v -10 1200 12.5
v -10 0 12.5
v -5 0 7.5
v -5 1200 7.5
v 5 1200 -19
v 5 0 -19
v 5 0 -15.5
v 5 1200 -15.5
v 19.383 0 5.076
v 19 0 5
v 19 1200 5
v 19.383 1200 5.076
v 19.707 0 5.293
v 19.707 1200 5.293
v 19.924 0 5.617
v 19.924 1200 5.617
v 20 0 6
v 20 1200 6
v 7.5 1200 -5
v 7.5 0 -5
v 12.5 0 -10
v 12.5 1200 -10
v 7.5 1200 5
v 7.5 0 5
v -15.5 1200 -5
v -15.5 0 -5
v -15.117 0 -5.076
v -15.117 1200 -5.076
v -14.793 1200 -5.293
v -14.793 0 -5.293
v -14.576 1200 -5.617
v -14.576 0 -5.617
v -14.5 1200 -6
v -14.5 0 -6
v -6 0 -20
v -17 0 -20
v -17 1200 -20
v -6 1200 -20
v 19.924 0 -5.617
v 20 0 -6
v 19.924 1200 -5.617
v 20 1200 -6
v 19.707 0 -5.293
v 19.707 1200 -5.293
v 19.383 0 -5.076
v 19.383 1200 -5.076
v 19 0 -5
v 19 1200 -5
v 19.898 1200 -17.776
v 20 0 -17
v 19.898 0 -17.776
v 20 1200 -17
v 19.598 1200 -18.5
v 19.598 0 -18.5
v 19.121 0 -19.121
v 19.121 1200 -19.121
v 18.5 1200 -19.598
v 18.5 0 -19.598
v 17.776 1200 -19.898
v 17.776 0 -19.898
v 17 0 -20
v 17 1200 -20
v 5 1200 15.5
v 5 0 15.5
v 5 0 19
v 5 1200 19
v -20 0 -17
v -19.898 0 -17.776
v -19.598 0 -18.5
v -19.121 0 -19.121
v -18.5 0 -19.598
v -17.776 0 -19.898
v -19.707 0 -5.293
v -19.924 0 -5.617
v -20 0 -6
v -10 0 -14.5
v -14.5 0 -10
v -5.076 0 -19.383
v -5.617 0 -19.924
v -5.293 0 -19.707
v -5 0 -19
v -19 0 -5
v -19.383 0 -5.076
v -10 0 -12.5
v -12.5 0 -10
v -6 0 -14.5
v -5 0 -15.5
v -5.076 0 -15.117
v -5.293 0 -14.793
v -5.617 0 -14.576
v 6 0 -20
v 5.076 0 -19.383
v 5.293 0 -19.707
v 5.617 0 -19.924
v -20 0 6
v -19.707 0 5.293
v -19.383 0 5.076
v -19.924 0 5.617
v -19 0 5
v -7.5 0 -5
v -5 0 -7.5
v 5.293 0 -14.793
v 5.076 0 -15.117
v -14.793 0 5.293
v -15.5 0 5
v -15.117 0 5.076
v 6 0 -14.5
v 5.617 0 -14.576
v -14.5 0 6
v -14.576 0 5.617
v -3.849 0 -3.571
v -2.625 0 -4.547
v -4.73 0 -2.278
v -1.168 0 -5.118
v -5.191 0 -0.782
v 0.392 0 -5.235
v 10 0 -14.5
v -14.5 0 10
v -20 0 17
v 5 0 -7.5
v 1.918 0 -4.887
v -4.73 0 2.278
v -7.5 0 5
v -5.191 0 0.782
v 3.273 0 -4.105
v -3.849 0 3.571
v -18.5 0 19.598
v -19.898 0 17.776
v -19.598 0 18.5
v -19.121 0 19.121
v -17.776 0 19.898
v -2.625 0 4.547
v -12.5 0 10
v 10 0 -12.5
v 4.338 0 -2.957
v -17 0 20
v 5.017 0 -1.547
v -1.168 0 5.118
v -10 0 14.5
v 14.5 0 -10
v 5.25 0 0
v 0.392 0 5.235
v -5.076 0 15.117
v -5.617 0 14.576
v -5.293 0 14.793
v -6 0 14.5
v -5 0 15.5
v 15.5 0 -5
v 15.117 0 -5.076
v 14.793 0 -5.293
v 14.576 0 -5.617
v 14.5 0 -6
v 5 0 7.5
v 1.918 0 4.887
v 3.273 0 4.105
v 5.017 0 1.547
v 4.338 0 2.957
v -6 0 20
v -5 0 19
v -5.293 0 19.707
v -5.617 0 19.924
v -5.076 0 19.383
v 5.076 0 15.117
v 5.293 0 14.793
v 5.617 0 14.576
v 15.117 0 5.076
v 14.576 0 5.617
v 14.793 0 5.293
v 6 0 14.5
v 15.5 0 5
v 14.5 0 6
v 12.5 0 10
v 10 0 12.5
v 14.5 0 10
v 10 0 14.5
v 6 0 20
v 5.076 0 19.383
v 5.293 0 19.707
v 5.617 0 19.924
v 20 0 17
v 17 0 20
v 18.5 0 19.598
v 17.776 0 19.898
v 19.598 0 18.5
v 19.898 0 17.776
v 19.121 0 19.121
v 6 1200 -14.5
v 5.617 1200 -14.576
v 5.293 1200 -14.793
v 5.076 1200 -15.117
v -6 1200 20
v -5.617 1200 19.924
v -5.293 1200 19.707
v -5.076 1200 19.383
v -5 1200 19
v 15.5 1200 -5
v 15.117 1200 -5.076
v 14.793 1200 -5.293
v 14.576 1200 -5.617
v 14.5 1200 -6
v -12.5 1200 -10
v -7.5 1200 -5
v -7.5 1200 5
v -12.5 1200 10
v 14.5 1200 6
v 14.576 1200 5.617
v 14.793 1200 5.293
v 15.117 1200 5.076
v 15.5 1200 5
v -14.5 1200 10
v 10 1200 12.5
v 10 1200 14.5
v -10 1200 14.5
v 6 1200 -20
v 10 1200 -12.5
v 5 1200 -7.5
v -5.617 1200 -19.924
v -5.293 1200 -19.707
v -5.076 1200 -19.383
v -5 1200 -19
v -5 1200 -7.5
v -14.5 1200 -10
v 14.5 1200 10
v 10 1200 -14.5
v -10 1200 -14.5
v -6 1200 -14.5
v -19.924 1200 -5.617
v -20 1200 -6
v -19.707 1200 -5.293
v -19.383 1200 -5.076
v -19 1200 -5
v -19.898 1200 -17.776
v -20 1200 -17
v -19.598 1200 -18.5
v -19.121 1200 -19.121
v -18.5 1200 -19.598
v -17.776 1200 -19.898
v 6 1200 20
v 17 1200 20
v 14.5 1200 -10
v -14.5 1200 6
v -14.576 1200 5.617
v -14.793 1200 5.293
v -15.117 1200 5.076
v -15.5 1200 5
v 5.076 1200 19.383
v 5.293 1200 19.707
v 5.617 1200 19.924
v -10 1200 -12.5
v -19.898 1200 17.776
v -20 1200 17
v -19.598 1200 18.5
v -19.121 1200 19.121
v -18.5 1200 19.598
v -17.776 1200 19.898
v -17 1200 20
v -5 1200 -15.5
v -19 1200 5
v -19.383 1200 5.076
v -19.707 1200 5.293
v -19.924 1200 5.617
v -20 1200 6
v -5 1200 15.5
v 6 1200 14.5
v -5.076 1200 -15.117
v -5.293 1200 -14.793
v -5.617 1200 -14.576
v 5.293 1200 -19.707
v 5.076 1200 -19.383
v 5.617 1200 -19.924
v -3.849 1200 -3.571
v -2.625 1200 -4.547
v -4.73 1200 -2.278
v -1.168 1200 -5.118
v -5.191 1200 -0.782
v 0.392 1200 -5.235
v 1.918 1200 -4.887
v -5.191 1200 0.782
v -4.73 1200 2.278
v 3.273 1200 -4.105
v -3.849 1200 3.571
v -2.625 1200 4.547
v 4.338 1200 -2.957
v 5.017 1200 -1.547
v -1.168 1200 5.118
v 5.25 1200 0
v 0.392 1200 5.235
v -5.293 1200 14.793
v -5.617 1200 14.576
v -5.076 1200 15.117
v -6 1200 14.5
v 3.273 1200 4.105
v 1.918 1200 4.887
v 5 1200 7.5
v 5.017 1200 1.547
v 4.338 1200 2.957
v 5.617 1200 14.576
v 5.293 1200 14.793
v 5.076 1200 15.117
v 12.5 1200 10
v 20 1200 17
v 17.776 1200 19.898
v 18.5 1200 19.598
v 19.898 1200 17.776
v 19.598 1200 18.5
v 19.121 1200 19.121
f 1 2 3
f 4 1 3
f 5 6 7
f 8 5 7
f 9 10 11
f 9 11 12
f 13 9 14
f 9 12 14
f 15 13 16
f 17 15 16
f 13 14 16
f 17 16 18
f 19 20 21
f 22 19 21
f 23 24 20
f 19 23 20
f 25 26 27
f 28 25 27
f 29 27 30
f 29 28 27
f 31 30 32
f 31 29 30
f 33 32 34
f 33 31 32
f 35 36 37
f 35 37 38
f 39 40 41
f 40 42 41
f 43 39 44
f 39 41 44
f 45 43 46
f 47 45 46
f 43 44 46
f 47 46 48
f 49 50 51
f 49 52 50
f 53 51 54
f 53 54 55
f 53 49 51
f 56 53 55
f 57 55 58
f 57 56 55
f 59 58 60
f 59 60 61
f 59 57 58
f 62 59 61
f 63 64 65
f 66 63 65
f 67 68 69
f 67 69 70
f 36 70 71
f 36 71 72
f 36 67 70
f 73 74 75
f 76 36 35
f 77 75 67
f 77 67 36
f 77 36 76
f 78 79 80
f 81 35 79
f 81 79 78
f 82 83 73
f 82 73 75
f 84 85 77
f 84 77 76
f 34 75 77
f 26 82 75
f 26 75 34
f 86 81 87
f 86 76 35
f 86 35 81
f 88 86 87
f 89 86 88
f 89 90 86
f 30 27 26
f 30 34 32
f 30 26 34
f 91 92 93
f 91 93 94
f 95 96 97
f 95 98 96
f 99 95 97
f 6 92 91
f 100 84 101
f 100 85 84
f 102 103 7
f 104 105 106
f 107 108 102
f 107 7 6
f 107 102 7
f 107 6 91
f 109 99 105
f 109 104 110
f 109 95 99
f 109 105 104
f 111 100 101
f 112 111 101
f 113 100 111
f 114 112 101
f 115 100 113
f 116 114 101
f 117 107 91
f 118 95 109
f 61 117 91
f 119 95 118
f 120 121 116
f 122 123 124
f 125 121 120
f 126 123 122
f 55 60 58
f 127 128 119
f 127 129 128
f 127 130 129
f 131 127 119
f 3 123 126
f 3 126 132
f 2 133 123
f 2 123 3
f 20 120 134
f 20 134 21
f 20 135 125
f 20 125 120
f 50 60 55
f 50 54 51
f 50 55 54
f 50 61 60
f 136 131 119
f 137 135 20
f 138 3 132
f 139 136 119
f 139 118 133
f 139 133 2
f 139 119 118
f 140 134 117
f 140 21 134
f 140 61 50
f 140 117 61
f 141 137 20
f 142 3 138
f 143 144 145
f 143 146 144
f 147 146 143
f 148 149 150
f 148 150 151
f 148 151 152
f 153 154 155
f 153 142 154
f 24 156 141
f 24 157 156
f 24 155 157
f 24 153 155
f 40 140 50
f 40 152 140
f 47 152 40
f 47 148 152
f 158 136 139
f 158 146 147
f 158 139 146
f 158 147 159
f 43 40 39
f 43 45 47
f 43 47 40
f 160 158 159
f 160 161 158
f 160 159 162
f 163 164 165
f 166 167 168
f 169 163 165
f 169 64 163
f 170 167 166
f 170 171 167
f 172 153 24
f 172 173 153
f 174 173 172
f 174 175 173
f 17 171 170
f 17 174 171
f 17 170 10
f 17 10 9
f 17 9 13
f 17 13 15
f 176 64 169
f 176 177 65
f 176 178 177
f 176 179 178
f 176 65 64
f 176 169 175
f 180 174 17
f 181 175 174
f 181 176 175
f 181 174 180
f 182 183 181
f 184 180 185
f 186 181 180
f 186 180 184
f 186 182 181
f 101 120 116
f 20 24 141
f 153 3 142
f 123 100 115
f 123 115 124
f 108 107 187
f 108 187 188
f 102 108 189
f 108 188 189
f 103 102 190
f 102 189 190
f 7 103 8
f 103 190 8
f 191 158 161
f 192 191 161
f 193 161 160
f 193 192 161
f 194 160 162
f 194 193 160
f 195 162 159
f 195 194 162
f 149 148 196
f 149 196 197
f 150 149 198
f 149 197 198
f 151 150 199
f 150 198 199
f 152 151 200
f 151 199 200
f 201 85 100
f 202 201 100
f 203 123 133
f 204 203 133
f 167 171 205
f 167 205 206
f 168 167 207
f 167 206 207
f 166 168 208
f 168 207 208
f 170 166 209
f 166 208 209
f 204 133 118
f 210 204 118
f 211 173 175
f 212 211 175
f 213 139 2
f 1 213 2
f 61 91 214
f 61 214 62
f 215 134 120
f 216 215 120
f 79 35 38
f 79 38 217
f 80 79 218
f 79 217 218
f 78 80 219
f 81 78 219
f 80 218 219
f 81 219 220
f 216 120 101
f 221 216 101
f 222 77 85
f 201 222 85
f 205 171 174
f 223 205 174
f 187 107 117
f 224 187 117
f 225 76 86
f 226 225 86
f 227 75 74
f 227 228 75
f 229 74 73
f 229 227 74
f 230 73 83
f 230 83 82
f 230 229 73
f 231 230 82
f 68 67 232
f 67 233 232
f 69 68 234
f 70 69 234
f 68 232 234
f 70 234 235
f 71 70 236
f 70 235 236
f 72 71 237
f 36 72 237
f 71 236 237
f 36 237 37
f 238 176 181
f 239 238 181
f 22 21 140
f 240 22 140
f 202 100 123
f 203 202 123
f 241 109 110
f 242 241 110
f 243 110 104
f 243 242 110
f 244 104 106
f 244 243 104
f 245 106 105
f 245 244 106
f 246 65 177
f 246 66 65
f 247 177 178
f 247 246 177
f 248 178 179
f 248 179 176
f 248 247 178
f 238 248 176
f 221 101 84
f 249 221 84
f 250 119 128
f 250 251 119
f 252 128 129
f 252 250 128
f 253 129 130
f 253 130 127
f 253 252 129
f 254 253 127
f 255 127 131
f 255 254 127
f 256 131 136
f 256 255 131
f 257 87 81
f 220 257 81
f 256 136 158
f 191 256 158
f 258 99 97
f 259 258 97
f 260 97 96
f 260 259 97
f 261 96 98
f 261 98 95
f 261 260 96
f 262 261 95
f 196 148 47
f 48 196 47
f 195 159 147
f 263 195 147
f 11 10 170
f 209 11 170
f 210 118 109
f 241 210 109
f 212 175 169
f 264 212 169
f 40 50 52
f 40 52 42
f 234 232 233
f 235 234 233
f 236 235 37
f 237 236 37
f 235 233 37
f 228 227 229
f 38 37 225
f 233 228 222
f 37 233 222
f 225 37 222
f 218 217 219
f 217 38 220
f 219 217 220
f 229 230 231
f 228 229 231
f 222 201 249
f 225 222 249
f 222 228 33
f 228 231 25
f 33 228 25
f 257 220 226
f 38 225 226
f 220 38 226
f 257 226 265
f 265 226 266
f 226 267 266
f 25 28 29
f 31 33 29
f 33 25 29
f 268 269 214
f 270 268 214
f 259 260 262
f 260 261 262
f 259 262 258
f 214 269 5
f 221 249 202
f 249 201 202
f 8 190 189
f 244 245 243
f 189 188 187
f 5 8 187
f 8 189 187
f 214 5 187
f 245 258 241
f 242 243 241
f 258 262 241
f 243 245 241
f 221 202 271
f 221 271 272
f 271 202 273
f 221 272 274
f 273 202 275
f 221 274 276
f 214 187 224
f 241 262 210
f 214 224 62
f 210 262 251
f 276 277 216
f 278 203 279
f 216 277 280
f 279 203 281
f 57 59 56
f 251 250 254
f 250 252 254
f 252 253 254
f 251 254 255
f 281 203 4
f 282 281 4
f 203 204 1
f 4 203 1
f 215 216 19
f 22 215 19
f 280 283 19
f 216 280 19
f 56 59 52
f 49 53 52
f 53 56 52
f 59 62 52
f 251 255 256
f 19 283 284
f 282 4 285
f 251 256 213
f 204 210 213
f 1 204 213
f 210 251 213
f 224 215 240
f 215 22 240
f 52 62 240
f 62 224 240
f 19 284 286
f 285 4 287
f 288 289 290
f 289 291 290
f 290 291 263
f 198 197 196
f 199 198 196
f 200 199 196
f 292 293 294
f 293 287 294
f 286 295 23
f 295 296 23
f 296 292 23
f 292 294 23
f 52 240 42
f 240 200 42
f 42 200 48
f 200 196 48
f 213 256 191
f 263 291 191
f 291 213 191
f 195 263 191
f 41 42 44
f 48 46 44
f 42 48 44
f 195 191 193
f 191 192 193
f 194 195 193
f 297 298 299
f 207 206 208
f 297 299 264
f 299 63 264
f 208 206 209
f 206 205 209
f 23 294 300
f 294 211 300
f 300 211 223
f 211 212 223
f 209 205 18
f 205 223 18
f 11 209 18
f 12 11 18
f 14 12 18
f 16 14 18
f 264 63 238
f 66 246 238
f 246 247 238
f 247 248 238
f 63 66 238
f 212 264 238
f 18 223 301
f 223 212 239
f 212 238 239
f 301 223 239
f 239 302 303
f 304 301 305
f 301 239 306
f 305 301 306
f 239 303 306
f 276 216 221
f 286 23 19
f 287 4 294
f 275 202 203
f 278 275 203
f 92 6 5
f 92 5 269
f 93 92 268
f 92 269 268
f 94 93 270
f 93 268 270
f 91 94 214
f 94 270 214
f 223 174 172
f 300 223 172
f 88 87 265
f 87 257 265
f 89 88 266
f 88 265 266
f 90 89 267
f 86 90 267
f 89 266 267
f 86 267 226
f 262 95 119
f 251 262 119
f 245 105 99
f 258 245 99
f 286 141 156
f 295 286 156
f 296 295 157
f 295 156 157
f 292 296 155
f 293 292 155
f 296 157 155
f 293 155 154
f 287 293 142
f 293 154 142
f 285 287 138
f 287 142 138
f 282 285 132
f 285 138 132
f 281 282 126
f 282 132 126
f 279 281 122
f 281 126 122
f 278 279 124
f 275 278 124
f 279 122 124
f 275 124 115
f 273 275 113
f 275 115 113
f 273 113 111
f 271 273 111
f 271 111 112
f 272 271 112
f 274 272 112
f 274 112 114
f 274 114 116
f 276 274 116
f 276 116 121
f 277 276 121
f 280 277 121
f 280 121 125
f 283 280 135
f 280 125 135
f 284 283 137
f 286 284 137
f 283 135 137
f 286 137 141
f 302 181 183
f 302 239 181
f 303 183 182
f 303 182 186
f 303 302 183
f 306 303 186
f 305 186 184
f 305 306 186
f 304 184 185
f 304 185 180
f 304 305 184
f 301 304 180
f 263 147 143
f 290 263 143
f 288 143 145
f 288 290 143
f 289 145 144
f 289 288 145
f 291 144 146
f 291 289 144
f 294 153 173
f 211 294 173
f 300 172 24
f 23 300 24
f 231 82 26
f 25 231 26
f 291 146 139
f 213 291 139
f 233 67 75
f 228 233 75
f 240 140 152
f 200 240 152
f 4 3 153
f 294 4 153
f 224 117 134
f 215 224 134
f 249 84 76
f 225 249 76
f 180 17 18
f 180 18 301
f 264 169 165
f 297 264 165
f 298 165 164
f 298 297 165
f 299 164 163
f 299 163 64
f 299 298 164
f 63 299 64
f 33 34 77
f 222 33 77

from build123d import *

# Parameters (mm, degrees)
F0_W     = 40
F0_H     = 40
F1_DEPTH = 1200
F2_R     = 5.25
F3_DEPTH = 1200
F5_DEPTH = 1200
F6_R     = 3
F7_R     = 1


with BuildPart() as f1:
    # F0 (on Front) → F1 (new body)
    with BuildSketch(Plane.XZ):
        Rectangle(F0_W, F0_H)
    extrude(amount=-F1_DEPTH)

    # F2 (on Front) → F3 (cut)
    with BuildSketch(Plane.XZ):
        Circle(F2_R)
    extrude(amount=-F3_DEPTH, mode=Mode.SUBTRACT)

    # F4 (on Front) → F5 (cut)
    with BuildSketch(Plane.XZ):
        Polygon((10, 12.5), (10, 14.5), (5, 14.5), (5, 20), (-5, 20), (-5, 14.5), (-10, 14.5), (-10, 12.5), (-5, 7.5), (5, 7.5), align=None)
        Polygon((20, 5), (14.5, 5), (14.5, 10), (12.5, 10), (7.5, 5), (7.5, -5), (12.5, -10), (14.5, -10), (14.5, -5), (20, -5), align=None)
        Polygon((10, -12.5), (5, -7.5), (-5, -7.5), (-10, -12.5), (-10, -14.5), (-5, -14.5), (-5, -20), (5, -20), (5, -14.5), (10, -14.5), align=None)
        Polygon((-12.5, -10), (-7.5, -5), (-7.5, 5), (-12.5, 10), (-14.5, 10), (-14.5, 5), (-20, 5), (-20, -5), (-14.5, -5), (-14.5, -10), align=None)
    extrude(amount=-F5_DEPTH, mode=Mode.SUBTRACT)

    # F6
    f6_edges = [f1.edges().sort_by_distance(p)[0] for p in [
        (-20, 600, 20),
        (20, 600, 20),
        (20, 600, -20),
        (-20, 600, -20),
    ]]
    fillet(f6_edges, radius=F6_R)

    # F7
    f7_edges = [f1.edges().sort_by_distance(p)[0] for p in [
        (-5, 600, 20),
        (-5, 600, 14.5),
        (5, 600, 20),
        (20, 600, 5),
        (14.5, 600, -5),
        (20, 600, -5),
        (5, 600, -14.5),
        (-5, 600, -14.5),
        (-5, 600, -20),
        (-20, 600, -5),
        (-14.5, 600, -5),
        (-14.5, 600, 5),
        (5, 600, -20),
        (14.5, 600, 5),
        (5, 600, 14.5),
        (-20, 600, 5),
    ]]
    fillet(f7_edges, radius=F7_R)


solid = f1.part
